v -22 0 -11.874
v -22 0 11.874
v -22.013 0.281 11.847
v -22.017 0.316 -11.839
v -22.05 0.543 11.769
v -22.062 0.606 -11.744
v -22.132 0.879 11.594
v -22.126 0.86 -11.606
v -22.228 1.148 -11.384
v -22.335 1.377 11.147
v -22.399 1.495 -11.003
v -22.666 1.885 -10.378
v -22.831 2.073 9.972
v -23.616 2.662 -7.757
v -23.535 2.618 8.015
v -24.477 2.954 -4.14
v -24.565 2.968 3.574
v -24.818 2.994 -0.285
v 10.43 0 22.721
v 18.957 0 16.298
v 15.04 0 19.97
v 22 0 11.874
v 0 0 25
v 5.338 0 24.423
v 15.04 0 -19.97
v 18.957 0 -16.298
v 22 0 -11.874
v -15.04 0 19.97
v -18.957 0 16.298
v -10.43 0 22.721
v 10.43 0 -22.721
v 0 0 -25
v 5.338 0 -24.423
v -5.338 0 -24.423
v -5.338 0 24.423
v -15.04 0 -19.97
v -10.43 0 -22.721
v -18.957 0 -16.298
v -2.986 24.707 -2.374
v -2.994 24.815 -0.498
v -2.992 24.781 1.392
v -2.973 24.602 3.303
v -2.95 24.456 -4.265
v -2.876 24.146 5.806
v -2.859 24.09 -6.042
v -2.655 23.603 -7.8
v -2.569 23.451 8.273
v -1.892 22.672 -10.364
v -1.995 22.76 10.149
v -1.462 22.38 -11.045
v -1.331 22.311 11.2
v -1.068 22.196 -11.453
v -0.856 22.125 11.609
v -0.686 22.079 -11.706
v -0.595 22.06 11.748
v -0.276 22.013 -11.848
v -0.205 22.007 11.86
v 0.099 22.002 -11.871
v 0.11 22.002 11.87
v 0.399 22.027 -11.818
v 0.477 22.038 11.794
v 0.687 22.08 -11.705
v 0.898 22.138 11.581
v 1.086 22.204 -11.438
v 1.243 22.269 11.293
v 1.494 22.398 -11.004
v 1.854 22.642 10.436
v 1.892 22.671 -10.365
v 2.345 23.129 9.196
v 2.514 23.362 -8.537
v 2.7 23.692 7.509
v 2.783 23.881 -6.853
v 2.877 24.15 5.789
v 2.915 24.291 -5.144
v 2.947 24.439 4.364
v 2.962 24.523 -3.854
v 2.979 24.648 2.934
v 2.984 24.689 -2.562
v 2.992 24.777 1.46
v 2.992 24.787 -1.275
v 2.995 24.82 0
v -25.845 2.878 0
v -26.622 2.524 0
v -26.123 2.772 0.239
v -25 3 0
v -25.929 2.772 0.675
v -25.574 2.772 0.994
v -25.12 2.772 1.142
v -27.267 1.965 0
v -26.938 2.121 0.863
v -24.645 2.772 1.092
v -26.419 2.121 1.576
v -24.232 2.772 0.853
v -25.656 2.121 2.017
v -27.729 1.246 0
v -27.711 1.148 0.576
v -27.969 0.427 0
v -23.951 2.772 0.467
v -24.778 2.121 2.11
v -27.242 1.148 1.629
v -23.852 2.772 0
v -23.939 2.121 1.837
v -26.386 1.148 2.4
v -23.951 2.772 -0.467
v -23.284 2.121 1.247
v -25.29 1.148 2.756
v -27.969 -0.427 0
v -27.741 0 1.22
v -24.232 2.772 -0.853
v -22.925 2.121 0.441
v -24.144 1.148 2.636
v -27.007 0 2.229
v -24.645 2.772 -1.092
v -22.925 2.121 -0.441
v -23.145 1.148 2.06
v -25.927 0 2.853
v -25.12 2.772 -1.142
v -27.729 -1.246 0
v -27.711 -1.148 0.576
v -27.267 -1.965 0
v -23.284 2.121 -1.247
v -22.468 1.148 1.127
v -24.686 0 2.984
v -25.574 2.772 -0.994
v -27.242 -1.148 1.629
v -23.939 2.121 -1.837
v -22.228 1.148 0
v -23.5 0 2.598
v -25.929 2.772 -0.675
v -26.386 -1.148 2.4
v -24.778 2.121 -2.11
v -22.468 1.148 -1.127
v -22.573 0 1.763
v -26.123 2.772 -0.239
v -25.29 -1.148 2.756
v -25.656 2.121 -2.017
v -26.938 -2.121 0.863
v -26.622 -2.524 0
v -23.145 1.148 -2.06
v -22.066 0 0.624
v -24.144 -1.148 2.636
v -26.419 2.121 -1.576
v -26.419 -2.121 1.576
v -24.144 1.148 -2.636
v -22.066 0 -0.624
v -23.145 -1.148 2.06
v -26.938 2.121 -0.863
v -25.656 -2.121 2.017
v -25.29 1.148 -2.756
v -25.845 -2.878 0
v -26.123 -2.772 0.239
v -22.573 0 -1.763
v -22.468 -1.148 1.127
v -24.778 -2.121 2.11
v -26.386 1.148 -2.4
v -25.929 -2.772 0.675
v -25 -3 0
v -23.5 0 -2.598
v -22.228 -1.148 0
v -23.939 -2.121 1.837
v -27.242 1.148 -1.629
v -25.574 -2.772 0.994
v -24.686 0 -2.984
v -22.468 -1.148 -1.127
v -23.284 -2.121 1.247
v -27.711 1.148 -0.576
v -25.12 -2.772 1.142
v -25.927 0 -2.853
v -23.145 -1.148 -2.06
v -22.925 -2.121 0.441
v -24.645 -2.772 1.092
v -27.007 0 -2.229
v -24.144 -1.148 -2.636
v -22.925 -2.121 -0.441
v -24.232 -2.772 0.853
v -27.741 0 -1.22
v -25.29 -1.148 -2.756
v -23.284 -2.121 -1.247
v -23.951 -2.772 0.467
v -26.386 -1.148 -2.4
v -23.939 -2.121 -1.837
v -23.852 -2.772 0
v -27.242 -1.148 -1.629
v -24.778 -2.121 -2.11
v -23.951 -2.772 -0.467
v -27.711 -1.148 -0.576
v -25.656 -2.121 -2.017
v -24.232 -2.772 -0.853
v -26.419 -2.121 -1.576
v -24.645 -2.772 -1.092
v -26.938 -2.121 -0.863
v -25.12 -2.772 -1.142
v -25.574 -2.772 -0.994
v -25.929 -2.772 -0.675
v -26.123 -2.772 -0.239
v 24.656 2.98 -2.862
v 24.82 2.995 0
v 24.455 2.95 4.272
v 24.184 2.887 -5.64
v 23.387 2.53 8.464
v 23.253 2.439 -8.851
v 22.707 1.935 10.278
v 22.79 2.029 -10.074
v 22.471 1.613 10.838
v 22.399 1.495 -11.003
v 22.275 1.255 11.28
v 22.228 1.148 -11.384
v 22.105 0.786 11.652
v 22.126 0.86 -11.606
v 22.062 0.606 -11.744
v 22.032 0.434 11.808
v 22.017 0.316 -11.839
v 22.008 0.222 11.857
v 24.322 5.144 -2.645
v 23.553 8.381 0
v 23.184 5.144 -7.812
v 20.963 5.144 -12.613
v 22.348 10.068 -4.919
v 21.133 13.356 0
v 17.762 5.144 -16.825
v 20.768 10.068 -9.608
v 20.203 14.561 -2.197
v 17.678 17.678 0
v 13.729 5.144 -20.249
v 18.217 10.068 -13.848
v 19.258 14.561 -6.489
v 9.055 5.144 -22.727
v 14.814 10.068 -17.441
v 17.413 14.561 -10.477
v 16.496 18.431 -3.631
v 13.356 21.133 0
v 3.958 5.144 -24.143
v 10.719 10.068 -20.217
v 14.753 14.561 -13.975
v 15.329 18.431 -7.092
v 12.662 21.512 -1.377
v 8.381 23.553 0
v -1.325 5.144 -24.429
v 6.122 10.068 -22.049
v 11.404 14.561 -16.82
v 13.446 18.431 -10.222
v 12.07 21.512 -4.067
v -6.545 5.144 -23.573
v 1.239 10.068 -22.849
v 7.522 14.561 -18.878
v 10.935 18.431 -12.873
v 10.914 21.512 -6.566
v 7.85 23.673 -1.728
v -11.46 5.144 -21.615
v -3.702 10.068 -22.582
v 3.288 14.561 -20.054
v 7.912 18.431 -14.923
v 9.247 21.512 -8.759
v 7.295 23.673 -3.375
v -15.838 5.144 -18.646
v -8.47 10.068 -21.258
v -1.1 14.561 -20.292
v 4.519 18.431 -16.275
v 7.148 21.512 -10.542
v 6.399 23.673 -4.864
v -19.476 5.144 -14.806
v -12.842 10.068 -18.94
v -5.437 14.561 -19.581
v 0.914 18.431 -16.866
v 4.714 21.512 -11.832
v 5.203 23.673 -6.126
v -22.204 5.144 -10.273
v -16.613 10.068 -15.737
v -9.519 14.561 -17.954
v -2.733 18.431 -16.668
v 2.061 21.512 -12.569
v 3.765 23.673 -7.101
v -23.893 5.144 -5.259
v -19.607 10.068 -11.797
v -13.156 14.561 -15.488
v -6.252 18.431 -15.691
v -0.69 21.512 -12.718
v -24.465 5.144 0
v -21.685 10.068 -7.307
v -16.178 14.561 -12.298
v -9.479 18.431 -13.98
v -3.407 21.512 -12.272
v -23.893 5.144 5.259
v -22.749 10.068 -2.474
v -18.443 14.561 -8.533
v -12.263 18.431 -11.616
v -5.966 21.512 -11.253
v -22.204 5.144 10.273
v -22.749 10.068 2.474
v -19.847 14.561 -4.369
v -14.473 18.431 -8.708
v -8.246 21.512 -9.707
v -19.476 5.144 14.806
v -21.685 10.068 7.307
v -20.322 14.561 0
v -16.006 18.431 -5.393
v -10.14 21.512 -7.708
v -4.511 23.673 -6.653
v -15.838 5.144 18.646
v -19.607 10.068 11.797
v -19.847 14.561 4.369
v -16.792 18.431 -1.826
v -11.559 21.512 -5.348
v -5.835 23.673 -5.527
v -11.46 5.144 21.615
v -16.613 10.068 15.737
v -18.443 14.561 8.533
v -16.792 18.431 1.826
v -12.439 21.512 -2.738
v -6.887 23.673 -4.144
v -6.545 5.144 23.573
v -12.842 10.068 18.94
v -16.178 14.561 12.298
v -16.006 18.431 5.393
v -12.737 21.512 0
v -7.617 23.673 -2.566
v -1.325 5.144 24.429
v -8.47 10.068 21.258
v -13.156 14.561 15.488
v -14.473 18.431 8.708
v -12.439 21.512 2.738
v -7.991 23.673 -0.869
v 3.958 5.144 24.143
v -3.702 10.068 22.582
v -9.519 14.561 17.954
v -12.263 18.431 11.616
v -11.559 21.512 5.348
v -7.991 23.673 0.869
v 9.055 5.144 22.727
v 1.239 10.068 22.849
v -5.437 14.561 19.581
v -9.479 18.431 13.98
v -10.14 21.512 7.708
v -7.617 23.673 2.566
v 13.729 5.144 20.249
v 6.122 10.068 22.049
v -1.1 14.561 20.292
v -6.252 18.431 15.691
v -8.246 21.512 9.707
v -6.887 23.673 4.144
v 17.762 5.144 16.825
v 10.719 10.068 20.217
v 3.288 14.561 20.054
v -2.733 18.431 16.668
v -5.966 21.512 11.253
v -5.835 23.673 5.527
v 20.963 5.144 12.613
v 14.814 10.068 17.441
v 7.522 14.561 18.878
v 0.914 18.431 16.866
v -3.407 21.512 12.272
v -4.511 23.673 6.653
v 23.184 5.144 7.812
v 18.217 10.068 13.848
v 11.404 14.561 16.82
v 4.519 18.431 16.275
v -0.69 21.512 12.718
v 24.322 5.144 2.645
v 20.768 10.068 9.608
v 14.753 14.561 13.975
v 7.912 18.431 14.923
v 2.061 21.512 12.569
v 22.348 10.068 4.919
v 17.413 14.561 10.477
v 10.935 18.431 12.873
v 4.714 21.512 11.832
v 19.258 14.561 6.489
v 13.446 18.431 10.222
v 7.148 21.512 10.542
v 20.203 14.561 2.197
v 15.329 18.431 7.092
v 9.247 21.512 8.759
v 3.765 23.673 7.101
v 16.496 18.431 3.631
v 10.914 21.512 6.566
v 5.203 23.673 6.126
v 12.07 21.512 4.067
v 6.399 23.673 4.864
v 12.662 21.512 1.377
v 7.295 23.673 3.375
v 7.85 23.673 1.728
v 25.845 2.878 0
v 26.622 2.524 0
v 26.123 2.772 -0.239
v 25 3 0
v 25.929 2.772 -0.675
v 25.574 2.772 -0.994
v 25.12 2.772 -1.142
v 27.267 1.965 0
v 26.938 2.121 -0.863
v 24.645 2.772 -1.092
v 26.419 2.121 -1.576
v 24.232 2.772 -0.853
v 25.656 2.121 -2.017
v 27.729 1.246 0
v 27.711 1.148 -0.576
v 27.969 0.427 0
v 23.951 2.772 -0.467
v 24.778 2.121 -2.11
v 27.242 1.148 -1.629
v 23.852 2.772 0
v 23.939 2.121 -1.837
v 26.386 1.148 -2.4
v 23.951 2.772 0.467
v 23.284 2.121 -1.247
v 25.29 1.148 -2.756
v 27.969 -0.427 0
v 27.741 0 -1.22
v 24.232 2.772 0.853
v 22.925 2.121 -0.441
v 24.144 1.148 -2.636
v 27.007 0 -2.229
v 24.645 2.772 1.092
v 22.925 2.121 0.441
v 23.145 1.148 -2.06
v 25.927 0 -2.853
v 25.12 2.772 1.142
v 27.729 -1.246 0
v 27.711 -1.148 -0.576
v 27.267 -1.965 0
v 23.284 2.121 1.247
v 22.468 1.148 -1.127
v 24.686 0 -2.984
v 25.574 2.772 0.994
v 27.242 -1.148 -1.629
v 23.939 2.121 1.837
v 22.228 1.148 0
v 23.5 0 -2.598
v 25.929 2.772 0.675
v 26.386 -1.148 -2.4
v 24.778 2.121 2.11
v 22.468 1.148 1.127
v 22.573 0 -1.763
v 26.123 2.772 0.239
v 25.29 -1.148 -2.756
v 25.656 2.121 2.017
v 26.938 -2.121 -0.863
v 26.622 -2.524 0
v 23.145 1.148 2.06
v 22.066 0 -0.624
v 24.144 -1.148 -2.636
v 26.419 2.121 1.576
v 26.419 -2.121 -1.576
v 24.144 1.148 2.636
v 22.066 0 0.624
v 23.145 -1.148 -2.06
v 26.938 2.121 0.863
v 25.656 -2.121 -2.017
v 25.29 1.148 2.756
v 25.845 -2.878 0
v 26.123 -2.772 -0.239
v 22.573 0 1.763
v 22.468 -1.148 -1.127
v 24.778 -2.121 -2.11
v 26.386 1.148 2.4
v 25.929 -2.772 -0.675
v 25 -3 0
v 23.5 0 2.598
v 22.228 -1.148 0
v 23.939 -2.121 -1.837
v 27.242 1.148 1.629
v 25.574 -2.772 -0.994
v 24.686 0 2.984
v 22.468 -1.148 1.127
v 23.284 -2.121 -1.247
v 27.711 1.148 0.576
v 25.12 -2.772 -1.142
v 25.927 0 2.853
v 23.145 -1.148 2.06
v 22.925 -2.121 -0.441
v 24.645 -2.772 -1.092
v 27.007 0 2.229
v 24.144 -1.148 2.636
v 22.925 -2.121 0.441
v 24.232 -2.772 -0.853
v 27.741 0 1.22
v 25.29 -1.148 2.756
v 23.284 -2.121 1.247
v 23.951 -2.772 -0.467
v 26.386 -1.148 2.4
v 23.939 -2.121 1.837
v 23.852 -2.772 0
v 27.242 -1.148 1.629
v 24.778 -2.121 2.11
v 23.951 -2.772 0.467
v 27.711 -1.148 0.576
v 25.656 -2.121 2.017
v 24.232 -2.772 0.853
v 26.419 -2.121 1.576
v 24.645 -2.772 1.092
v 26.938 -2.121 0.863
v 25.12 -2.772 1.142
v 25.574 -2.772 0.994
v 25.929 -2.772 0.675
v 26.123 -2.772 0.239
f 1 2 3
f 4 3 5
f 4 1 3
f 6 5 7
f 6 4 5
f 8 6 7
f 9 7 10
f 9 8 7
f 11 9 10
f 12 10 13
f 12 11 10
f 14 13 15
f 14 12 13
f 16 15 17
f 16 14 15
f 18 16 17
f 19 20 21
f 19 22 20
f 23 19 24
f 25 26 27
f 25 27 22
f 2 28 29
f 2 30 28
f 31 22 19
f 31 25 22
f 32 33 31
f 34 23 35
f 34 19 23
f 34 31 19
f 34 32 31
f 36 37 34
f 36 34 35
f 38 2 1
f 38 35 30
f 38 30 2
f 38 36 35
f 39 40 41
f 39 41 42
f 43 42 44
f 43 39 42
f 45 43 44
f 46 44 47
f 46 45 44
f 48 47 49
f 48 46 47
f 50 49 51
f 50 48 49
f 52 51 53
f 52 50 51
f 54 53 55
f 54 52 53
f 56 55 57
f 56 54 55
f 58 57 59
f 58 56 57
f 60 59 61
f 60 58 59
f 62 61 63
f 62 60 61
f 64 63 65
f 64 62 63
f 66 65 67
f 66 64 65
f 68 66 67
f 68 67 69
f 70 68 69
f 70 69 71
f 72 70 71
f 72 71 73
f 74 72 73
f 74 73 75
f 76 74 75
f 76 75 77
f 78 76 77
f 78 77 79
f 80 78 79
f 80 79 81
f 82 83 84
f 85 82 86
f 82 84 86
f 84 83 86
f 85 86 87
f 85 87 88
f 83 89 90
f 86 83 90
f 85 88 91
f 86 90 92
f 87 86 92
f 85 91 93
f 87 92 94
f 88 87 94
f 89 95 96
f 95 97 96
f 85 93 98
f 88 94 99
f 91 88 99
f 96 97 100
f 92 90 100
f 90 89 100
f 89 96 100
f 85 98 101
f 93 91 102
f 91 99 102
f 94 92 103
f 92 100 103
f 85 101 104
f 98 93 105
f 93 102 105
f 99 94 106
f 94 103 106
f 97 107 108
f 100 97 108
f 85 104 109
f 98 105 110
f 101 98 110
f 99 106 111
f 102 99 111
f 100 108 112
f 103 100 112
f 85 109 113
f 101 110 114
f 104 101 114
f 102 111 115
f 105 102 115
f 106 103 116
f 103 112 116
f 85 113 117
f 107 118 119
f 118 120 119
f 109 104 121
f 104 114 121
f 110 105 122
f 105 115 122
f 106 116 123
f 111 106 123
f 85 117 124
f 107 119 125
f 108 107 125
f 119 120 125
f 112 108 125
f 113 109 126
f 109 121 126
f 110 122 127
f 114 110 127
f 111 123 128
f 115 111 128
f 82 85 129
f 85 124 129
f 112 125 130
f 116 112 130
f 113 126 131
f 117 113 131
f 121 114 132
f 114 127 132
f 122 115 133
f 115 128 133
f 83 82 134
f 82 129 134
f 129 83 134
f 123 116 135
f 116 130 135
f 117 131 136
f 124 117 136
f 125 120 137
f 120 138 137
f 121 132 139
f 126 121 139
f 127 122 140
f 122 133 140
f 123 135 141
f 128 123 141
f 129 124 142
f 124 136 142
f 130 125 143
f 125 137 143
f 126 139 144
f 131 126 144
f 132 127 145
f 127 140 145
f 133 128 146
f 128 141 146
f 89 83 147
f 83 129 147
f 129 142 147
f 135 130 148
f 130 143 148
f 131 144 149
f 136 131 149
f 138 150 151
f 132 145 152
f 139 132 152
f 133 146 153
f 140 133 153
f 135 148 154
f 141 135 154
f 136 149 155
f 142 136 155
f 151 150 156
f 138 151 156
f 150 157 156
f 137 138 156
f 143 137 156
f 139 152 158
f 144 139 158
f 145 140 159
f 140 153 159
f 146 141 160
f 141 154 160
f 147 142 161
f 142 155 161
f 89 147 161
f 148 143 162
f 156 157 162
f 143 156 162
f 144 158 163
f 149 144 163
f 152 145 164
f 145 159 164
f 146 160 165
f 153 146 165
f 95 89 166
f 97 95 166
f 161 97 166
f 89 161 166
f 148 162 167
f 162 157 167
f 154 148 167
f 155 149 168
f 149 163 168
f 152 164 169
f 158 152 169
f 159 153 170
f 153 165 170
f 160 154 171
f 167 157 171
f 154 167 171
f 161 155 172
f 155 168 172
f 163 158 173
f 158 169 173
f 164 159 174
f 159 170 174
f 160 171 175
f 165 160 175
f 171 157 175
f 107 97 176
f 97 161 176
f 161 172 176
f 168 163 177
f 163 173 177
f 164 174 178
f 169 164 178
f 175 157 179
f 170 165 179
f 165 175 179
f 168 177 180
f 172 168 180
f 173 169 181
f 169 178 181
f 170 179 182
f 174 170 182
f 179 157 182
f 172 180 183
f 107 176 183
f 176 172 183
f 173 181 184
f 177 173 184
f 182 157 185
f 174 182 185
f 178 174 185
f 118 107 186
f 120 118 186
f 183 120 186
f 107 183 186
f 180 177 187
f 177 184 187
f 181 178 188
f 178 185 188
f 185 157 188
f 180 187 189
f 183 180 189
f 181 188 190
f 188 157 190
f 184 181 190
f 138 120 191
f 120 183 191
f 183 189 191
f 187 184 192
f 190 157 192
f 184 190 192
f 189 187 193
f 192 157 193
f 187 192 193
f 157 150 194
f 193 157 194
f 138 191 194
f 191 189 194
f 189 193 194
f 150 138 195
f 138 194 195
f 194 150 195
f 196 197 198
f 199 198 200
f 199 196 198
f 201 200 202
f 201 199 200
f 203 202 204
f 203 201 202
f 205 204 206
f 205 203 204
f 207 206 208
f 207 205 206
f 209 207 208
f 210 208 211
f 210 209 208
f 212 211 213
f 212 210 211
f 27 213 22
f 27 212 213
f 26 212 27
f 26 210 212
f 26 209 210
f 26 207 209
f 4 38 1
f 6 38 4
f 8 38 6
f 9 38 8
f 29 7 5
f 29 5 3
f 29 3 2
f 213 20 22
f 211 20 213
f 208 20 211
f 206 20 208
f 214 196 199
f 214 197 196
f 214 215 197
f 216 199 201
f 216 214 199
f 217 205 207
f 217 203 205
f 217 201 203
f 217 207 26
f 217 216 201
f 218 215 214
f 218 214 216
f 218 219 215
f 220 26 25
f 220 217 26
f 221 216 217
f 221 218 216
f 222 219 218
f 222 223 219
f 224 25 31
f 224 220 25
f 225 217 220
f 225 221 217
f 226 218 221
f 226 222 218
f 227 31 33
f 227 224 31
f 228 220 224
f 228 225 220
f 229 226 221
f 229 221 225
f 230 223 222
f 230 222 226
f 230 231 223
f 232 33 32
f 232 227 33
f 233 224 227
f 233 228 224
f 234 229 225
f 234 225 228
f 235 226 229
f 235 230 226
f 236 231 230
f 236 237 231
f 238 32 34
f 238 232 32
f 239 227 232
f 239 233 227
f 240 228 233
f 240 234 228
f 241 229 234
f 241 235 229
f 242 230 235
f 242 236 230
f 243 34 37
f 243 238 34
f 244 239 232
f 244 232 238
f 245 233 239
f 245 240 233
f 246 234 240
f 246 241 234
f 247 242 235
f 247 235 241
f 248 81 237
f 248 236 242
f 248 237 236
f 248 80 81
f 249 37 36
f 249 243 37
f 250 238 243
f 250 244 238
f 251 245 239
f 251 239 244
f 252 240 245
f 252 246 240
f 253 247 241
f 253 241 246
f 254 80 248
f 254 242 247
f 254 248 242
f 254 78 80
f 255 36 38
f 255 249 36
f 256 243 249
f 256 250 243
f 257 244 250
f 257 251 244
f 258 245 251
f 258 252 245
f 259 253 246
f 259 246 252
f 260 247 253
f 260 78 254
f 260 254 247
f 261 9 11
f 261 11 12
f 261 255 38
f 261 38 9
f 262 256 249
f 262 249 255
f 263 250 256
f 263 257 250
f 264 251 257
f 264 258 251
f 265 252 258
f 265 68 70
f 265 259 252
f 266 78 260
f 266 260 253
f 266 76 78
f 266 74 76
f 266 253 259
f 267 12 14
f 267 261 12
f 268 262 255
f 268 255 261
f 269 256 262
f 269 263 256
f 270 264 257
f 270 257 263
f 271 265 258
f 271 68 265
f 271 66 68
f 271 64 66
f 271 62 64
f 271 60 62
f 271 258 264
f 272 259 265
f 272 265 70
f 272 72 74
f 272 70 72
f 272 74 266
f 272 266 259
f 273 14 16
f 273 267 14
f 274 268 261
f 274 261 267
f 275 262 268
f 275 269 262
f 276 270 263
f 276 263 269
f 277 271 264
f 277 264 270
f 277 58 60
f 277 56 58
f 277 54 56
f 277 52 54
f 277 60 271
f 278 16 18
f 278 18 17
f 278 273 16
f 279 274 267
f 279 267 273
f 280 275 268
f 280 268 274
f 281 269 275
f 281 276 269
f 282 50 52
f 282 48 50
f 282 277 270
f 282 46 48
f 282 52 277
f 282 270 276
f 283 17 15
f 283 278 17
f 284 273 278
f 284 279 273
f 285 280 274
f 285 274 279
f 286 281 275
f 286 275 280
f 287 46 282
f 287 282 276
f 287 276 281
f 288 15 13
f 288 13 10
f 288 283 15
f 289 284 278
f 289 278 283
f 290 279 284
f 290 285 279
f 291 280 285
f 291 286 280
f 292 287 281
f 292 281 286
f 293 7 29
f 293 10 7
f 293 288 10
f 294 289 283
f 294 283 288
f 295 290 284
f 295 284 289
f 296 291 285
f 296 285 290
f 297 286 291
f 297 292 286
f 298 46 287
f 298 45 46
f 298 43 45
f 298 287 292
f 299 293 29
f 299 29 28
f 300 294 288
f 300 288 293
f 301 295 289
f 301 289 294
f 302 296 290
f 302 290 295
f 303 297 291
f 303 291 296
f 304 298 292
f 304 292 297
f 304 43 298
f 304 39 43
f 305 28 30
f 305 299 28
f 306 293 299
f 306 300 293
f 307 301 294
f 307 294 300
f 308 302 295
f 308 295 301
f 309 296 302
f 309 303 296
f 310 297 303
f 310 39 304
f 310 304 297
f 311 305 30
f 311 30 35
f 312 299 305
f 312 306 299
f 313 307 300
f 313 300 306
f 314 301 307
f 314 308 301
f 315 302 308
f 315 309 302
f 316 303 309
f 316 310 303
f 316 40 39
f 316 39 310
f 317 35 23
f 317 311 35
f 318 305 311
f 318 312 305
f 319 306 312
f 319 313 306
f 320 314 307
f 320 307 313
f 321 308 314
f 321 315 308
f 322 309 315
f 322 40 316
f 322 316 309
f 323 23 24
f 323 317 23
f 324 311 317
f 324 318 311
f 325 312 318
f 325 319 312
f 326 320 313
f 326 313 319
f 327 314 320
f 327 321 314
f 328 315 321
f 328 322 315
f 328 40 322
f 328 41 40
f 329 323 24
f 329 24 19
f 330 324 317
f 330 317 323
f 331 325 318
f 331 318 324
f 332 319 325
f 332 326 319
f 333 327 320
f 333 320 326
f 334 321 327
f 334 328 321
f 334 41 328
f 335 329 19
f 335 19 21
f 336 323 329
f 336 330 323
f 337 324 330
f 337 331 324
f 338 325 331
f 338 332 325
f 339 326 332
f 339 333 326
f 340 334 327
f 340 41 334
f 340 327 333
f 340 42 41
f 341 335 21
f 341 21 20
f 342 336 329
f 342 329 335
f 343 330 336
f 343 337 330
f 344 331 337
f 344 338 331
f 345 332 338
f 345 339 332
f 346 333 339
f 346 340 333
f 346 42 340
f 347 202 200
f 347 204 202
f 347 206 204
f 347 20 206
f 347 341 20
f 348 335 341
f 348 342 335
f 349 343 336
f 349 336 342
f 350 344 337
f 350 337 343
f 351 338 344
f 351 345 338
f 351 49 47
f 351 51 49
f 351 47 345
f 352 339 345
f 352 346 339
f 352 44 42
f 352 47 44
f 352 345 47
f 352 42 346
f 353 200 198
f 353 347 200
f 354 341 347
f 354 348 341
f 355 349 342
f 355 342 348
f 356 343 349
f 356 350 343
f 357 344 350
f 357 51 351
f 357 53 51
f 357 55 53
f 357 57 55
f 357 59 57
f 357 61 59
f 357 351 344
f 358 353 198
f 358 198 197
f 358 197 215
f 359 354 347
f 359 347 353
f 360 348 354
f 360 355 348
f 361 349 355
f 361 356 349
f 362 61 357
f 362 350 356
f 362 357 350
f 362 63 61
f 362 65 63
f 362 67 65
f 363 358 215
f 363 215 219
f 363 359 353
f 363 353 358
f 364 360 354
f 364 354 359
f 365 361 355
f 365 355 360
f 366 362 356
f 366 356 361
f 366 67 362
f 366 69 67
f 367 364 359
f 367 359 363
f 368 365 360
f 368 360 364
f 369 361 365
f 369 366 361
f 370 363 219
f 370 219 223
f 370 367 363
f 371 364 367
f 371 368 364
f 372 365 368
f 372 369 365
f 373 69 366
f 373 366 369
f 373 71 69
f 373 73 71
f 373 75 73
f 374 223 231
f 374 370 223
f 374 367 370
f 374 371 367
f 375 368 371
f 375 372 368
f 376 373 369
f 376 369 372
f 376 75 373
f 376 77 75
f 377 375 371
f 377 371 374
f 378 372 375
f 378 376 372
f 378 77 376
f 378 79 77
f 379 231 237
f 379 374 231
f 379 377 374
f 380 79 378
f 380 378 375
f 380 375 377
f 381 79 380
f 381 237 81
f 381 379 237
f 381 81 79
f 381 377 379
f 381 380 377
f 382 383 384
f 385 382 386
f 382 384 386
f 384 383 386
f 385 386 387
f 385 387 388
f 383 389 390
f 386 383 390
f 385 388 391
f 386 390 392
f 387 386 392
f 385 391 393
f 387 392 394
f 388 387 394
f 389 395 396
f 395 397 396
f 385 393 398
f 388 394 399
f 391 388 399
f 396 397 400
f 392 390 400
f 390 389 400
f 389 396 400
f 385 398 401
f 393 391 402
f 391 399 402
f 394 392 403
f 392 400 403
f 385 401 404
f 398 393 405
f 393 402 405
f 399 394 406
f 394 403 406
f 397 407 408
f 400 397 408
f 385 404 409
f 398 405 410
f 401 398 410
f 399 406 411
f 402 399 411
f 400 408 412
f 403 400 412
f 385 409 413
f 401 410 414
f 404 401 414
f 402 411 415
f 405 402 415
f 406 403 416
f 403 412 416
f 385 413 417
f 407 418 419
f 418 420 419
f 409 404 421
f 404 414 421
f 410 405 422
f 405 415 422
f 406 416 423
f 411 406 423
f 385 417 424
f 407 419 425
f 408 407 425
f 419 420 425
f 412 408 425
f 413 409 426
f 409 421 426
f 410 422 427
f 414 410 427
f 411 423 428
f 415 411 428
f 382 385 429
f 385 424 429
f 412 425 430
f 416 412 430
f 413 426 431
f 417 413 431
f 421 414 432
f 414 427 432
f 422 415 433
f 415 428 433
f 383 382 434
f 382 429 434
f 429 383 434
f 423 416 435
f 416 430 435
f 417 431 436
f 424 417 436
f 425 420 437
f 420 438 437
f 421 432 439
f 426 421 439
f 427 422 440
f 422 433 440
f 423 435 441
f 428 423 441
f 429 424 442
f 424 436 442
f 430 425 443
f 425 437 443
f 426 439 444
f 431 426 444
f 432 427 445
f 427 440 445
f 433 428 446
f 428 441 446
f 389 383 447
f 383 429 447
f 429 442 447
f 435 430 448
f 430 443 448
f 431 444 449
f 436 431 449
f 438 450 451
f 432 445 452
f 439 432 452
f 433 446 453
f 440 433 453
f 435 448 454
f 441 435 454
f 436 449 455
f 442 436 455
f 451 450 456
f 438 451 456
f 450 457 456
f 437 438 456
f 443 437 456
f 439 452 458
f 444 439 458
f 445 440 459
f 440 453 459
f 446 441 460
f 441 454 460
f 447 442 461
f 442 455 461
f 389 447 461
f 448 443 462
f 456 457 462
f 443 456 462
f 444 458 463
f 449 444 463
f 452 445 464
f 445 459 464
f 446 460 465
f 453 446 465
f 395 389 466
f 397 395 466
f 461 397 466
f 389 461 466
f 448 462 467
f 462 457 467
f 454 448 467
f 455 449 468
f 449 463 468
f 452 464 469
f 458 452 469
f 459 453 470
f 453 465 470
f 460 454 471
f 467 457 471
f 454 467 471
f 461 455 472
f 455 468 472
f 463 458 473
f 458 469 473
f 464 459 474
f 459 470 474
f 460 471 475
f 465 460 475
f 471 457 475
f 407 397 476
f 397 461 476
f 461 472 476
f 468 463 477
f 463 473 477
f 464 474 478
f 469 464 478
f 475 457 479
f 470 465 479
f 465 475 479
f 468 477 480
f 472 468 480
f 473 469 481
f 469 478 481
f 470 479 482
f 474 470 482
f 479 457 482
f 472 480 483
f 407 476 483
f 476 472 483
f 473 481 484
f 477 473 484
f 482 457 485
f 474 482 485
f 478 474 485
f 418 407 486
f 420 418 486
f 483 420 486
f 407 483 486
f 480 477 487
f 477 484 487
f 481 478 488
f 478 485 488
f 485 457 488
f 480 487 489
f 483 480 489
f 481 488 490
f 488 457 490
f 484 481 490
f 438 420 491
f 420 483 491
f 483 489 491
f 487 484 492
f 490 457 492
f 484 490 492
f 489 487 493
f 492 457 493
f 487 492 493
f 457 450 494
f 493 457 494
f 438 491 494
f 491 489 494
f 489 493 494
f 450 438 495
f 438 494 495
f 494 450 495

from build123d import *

# Parameters (mm, degrees)
CORTAR_EXTRUIR1_DEPTH      = 15
CORTAR_EXTRUIR1_DEPTH_BACK = 15
CROQUIS4_R                 = 3


# Read off the part's stored shape, not the designer's step: Revolución2
with BuildPart() as part:
    # Revolución2 outline → Revolución2 (revolve)
    with BuildSketch(Plane.XY):
        with BuildLine():
            Line((0, 0), (25, -2.5e-08))
            ThreePointArc((25, -2.5e-08), (17.677669539, 17.677669521), (0, 25))
            Line((0, 25), (0, 0))
        make_face()
    revolve(axis=Axis((0, 0, 0), (0, 1, 0)))

    # Croquis4 → Cortar-Extruir1 (cut, two sides: drawn at the far end of the back side and taken through both)
    with BuildSketch(Plane.XY.offset(-CORTAR_EXTRUIR1_DEPTH_BACK)):
        with Locations((0, 25)):
            Circle(CROQUIS4_R)
        with Locations((25, 0)):
            Circle(CROQUIS4_R)
        with Locations((-25, 0)):
            Circle(CROQUIS4_R)
    extrude(amount=CORTAR_EXTRUIR1_DEPTH + CORTAR_EXTRUIR1_DEPTH_BACK, mode=Mode.SUBTRACT)


with BuildPart() as body_2:
    # Croquis10 → Revolución4 (revolve)
    with BuildSketch(Plane.XY):
        with BuildLine():
            Line((25, -3), (25, 3))
            ThreePointArc((25, 3), (28, 0), (25, -3))
        make_face()
    revolve(axis=Axis((25, -3, 0), (0, 1, 0)))


with BuildPart() as body_3:
    # Croquis11 → Revolución5 (revolve)
    with BuildSketch(Plane.XY):
        with BuildLine():
            Line((-25, -3), (-25, 3))
            ThreePointArc((-25, 3), (-28, 0), (-25, -3))
        make_face()
    revolve(axis=Axis((-25, -3, 0), (0, 1, 0)))


solid = Compound([part.part, body_2.part, body_3.part])
